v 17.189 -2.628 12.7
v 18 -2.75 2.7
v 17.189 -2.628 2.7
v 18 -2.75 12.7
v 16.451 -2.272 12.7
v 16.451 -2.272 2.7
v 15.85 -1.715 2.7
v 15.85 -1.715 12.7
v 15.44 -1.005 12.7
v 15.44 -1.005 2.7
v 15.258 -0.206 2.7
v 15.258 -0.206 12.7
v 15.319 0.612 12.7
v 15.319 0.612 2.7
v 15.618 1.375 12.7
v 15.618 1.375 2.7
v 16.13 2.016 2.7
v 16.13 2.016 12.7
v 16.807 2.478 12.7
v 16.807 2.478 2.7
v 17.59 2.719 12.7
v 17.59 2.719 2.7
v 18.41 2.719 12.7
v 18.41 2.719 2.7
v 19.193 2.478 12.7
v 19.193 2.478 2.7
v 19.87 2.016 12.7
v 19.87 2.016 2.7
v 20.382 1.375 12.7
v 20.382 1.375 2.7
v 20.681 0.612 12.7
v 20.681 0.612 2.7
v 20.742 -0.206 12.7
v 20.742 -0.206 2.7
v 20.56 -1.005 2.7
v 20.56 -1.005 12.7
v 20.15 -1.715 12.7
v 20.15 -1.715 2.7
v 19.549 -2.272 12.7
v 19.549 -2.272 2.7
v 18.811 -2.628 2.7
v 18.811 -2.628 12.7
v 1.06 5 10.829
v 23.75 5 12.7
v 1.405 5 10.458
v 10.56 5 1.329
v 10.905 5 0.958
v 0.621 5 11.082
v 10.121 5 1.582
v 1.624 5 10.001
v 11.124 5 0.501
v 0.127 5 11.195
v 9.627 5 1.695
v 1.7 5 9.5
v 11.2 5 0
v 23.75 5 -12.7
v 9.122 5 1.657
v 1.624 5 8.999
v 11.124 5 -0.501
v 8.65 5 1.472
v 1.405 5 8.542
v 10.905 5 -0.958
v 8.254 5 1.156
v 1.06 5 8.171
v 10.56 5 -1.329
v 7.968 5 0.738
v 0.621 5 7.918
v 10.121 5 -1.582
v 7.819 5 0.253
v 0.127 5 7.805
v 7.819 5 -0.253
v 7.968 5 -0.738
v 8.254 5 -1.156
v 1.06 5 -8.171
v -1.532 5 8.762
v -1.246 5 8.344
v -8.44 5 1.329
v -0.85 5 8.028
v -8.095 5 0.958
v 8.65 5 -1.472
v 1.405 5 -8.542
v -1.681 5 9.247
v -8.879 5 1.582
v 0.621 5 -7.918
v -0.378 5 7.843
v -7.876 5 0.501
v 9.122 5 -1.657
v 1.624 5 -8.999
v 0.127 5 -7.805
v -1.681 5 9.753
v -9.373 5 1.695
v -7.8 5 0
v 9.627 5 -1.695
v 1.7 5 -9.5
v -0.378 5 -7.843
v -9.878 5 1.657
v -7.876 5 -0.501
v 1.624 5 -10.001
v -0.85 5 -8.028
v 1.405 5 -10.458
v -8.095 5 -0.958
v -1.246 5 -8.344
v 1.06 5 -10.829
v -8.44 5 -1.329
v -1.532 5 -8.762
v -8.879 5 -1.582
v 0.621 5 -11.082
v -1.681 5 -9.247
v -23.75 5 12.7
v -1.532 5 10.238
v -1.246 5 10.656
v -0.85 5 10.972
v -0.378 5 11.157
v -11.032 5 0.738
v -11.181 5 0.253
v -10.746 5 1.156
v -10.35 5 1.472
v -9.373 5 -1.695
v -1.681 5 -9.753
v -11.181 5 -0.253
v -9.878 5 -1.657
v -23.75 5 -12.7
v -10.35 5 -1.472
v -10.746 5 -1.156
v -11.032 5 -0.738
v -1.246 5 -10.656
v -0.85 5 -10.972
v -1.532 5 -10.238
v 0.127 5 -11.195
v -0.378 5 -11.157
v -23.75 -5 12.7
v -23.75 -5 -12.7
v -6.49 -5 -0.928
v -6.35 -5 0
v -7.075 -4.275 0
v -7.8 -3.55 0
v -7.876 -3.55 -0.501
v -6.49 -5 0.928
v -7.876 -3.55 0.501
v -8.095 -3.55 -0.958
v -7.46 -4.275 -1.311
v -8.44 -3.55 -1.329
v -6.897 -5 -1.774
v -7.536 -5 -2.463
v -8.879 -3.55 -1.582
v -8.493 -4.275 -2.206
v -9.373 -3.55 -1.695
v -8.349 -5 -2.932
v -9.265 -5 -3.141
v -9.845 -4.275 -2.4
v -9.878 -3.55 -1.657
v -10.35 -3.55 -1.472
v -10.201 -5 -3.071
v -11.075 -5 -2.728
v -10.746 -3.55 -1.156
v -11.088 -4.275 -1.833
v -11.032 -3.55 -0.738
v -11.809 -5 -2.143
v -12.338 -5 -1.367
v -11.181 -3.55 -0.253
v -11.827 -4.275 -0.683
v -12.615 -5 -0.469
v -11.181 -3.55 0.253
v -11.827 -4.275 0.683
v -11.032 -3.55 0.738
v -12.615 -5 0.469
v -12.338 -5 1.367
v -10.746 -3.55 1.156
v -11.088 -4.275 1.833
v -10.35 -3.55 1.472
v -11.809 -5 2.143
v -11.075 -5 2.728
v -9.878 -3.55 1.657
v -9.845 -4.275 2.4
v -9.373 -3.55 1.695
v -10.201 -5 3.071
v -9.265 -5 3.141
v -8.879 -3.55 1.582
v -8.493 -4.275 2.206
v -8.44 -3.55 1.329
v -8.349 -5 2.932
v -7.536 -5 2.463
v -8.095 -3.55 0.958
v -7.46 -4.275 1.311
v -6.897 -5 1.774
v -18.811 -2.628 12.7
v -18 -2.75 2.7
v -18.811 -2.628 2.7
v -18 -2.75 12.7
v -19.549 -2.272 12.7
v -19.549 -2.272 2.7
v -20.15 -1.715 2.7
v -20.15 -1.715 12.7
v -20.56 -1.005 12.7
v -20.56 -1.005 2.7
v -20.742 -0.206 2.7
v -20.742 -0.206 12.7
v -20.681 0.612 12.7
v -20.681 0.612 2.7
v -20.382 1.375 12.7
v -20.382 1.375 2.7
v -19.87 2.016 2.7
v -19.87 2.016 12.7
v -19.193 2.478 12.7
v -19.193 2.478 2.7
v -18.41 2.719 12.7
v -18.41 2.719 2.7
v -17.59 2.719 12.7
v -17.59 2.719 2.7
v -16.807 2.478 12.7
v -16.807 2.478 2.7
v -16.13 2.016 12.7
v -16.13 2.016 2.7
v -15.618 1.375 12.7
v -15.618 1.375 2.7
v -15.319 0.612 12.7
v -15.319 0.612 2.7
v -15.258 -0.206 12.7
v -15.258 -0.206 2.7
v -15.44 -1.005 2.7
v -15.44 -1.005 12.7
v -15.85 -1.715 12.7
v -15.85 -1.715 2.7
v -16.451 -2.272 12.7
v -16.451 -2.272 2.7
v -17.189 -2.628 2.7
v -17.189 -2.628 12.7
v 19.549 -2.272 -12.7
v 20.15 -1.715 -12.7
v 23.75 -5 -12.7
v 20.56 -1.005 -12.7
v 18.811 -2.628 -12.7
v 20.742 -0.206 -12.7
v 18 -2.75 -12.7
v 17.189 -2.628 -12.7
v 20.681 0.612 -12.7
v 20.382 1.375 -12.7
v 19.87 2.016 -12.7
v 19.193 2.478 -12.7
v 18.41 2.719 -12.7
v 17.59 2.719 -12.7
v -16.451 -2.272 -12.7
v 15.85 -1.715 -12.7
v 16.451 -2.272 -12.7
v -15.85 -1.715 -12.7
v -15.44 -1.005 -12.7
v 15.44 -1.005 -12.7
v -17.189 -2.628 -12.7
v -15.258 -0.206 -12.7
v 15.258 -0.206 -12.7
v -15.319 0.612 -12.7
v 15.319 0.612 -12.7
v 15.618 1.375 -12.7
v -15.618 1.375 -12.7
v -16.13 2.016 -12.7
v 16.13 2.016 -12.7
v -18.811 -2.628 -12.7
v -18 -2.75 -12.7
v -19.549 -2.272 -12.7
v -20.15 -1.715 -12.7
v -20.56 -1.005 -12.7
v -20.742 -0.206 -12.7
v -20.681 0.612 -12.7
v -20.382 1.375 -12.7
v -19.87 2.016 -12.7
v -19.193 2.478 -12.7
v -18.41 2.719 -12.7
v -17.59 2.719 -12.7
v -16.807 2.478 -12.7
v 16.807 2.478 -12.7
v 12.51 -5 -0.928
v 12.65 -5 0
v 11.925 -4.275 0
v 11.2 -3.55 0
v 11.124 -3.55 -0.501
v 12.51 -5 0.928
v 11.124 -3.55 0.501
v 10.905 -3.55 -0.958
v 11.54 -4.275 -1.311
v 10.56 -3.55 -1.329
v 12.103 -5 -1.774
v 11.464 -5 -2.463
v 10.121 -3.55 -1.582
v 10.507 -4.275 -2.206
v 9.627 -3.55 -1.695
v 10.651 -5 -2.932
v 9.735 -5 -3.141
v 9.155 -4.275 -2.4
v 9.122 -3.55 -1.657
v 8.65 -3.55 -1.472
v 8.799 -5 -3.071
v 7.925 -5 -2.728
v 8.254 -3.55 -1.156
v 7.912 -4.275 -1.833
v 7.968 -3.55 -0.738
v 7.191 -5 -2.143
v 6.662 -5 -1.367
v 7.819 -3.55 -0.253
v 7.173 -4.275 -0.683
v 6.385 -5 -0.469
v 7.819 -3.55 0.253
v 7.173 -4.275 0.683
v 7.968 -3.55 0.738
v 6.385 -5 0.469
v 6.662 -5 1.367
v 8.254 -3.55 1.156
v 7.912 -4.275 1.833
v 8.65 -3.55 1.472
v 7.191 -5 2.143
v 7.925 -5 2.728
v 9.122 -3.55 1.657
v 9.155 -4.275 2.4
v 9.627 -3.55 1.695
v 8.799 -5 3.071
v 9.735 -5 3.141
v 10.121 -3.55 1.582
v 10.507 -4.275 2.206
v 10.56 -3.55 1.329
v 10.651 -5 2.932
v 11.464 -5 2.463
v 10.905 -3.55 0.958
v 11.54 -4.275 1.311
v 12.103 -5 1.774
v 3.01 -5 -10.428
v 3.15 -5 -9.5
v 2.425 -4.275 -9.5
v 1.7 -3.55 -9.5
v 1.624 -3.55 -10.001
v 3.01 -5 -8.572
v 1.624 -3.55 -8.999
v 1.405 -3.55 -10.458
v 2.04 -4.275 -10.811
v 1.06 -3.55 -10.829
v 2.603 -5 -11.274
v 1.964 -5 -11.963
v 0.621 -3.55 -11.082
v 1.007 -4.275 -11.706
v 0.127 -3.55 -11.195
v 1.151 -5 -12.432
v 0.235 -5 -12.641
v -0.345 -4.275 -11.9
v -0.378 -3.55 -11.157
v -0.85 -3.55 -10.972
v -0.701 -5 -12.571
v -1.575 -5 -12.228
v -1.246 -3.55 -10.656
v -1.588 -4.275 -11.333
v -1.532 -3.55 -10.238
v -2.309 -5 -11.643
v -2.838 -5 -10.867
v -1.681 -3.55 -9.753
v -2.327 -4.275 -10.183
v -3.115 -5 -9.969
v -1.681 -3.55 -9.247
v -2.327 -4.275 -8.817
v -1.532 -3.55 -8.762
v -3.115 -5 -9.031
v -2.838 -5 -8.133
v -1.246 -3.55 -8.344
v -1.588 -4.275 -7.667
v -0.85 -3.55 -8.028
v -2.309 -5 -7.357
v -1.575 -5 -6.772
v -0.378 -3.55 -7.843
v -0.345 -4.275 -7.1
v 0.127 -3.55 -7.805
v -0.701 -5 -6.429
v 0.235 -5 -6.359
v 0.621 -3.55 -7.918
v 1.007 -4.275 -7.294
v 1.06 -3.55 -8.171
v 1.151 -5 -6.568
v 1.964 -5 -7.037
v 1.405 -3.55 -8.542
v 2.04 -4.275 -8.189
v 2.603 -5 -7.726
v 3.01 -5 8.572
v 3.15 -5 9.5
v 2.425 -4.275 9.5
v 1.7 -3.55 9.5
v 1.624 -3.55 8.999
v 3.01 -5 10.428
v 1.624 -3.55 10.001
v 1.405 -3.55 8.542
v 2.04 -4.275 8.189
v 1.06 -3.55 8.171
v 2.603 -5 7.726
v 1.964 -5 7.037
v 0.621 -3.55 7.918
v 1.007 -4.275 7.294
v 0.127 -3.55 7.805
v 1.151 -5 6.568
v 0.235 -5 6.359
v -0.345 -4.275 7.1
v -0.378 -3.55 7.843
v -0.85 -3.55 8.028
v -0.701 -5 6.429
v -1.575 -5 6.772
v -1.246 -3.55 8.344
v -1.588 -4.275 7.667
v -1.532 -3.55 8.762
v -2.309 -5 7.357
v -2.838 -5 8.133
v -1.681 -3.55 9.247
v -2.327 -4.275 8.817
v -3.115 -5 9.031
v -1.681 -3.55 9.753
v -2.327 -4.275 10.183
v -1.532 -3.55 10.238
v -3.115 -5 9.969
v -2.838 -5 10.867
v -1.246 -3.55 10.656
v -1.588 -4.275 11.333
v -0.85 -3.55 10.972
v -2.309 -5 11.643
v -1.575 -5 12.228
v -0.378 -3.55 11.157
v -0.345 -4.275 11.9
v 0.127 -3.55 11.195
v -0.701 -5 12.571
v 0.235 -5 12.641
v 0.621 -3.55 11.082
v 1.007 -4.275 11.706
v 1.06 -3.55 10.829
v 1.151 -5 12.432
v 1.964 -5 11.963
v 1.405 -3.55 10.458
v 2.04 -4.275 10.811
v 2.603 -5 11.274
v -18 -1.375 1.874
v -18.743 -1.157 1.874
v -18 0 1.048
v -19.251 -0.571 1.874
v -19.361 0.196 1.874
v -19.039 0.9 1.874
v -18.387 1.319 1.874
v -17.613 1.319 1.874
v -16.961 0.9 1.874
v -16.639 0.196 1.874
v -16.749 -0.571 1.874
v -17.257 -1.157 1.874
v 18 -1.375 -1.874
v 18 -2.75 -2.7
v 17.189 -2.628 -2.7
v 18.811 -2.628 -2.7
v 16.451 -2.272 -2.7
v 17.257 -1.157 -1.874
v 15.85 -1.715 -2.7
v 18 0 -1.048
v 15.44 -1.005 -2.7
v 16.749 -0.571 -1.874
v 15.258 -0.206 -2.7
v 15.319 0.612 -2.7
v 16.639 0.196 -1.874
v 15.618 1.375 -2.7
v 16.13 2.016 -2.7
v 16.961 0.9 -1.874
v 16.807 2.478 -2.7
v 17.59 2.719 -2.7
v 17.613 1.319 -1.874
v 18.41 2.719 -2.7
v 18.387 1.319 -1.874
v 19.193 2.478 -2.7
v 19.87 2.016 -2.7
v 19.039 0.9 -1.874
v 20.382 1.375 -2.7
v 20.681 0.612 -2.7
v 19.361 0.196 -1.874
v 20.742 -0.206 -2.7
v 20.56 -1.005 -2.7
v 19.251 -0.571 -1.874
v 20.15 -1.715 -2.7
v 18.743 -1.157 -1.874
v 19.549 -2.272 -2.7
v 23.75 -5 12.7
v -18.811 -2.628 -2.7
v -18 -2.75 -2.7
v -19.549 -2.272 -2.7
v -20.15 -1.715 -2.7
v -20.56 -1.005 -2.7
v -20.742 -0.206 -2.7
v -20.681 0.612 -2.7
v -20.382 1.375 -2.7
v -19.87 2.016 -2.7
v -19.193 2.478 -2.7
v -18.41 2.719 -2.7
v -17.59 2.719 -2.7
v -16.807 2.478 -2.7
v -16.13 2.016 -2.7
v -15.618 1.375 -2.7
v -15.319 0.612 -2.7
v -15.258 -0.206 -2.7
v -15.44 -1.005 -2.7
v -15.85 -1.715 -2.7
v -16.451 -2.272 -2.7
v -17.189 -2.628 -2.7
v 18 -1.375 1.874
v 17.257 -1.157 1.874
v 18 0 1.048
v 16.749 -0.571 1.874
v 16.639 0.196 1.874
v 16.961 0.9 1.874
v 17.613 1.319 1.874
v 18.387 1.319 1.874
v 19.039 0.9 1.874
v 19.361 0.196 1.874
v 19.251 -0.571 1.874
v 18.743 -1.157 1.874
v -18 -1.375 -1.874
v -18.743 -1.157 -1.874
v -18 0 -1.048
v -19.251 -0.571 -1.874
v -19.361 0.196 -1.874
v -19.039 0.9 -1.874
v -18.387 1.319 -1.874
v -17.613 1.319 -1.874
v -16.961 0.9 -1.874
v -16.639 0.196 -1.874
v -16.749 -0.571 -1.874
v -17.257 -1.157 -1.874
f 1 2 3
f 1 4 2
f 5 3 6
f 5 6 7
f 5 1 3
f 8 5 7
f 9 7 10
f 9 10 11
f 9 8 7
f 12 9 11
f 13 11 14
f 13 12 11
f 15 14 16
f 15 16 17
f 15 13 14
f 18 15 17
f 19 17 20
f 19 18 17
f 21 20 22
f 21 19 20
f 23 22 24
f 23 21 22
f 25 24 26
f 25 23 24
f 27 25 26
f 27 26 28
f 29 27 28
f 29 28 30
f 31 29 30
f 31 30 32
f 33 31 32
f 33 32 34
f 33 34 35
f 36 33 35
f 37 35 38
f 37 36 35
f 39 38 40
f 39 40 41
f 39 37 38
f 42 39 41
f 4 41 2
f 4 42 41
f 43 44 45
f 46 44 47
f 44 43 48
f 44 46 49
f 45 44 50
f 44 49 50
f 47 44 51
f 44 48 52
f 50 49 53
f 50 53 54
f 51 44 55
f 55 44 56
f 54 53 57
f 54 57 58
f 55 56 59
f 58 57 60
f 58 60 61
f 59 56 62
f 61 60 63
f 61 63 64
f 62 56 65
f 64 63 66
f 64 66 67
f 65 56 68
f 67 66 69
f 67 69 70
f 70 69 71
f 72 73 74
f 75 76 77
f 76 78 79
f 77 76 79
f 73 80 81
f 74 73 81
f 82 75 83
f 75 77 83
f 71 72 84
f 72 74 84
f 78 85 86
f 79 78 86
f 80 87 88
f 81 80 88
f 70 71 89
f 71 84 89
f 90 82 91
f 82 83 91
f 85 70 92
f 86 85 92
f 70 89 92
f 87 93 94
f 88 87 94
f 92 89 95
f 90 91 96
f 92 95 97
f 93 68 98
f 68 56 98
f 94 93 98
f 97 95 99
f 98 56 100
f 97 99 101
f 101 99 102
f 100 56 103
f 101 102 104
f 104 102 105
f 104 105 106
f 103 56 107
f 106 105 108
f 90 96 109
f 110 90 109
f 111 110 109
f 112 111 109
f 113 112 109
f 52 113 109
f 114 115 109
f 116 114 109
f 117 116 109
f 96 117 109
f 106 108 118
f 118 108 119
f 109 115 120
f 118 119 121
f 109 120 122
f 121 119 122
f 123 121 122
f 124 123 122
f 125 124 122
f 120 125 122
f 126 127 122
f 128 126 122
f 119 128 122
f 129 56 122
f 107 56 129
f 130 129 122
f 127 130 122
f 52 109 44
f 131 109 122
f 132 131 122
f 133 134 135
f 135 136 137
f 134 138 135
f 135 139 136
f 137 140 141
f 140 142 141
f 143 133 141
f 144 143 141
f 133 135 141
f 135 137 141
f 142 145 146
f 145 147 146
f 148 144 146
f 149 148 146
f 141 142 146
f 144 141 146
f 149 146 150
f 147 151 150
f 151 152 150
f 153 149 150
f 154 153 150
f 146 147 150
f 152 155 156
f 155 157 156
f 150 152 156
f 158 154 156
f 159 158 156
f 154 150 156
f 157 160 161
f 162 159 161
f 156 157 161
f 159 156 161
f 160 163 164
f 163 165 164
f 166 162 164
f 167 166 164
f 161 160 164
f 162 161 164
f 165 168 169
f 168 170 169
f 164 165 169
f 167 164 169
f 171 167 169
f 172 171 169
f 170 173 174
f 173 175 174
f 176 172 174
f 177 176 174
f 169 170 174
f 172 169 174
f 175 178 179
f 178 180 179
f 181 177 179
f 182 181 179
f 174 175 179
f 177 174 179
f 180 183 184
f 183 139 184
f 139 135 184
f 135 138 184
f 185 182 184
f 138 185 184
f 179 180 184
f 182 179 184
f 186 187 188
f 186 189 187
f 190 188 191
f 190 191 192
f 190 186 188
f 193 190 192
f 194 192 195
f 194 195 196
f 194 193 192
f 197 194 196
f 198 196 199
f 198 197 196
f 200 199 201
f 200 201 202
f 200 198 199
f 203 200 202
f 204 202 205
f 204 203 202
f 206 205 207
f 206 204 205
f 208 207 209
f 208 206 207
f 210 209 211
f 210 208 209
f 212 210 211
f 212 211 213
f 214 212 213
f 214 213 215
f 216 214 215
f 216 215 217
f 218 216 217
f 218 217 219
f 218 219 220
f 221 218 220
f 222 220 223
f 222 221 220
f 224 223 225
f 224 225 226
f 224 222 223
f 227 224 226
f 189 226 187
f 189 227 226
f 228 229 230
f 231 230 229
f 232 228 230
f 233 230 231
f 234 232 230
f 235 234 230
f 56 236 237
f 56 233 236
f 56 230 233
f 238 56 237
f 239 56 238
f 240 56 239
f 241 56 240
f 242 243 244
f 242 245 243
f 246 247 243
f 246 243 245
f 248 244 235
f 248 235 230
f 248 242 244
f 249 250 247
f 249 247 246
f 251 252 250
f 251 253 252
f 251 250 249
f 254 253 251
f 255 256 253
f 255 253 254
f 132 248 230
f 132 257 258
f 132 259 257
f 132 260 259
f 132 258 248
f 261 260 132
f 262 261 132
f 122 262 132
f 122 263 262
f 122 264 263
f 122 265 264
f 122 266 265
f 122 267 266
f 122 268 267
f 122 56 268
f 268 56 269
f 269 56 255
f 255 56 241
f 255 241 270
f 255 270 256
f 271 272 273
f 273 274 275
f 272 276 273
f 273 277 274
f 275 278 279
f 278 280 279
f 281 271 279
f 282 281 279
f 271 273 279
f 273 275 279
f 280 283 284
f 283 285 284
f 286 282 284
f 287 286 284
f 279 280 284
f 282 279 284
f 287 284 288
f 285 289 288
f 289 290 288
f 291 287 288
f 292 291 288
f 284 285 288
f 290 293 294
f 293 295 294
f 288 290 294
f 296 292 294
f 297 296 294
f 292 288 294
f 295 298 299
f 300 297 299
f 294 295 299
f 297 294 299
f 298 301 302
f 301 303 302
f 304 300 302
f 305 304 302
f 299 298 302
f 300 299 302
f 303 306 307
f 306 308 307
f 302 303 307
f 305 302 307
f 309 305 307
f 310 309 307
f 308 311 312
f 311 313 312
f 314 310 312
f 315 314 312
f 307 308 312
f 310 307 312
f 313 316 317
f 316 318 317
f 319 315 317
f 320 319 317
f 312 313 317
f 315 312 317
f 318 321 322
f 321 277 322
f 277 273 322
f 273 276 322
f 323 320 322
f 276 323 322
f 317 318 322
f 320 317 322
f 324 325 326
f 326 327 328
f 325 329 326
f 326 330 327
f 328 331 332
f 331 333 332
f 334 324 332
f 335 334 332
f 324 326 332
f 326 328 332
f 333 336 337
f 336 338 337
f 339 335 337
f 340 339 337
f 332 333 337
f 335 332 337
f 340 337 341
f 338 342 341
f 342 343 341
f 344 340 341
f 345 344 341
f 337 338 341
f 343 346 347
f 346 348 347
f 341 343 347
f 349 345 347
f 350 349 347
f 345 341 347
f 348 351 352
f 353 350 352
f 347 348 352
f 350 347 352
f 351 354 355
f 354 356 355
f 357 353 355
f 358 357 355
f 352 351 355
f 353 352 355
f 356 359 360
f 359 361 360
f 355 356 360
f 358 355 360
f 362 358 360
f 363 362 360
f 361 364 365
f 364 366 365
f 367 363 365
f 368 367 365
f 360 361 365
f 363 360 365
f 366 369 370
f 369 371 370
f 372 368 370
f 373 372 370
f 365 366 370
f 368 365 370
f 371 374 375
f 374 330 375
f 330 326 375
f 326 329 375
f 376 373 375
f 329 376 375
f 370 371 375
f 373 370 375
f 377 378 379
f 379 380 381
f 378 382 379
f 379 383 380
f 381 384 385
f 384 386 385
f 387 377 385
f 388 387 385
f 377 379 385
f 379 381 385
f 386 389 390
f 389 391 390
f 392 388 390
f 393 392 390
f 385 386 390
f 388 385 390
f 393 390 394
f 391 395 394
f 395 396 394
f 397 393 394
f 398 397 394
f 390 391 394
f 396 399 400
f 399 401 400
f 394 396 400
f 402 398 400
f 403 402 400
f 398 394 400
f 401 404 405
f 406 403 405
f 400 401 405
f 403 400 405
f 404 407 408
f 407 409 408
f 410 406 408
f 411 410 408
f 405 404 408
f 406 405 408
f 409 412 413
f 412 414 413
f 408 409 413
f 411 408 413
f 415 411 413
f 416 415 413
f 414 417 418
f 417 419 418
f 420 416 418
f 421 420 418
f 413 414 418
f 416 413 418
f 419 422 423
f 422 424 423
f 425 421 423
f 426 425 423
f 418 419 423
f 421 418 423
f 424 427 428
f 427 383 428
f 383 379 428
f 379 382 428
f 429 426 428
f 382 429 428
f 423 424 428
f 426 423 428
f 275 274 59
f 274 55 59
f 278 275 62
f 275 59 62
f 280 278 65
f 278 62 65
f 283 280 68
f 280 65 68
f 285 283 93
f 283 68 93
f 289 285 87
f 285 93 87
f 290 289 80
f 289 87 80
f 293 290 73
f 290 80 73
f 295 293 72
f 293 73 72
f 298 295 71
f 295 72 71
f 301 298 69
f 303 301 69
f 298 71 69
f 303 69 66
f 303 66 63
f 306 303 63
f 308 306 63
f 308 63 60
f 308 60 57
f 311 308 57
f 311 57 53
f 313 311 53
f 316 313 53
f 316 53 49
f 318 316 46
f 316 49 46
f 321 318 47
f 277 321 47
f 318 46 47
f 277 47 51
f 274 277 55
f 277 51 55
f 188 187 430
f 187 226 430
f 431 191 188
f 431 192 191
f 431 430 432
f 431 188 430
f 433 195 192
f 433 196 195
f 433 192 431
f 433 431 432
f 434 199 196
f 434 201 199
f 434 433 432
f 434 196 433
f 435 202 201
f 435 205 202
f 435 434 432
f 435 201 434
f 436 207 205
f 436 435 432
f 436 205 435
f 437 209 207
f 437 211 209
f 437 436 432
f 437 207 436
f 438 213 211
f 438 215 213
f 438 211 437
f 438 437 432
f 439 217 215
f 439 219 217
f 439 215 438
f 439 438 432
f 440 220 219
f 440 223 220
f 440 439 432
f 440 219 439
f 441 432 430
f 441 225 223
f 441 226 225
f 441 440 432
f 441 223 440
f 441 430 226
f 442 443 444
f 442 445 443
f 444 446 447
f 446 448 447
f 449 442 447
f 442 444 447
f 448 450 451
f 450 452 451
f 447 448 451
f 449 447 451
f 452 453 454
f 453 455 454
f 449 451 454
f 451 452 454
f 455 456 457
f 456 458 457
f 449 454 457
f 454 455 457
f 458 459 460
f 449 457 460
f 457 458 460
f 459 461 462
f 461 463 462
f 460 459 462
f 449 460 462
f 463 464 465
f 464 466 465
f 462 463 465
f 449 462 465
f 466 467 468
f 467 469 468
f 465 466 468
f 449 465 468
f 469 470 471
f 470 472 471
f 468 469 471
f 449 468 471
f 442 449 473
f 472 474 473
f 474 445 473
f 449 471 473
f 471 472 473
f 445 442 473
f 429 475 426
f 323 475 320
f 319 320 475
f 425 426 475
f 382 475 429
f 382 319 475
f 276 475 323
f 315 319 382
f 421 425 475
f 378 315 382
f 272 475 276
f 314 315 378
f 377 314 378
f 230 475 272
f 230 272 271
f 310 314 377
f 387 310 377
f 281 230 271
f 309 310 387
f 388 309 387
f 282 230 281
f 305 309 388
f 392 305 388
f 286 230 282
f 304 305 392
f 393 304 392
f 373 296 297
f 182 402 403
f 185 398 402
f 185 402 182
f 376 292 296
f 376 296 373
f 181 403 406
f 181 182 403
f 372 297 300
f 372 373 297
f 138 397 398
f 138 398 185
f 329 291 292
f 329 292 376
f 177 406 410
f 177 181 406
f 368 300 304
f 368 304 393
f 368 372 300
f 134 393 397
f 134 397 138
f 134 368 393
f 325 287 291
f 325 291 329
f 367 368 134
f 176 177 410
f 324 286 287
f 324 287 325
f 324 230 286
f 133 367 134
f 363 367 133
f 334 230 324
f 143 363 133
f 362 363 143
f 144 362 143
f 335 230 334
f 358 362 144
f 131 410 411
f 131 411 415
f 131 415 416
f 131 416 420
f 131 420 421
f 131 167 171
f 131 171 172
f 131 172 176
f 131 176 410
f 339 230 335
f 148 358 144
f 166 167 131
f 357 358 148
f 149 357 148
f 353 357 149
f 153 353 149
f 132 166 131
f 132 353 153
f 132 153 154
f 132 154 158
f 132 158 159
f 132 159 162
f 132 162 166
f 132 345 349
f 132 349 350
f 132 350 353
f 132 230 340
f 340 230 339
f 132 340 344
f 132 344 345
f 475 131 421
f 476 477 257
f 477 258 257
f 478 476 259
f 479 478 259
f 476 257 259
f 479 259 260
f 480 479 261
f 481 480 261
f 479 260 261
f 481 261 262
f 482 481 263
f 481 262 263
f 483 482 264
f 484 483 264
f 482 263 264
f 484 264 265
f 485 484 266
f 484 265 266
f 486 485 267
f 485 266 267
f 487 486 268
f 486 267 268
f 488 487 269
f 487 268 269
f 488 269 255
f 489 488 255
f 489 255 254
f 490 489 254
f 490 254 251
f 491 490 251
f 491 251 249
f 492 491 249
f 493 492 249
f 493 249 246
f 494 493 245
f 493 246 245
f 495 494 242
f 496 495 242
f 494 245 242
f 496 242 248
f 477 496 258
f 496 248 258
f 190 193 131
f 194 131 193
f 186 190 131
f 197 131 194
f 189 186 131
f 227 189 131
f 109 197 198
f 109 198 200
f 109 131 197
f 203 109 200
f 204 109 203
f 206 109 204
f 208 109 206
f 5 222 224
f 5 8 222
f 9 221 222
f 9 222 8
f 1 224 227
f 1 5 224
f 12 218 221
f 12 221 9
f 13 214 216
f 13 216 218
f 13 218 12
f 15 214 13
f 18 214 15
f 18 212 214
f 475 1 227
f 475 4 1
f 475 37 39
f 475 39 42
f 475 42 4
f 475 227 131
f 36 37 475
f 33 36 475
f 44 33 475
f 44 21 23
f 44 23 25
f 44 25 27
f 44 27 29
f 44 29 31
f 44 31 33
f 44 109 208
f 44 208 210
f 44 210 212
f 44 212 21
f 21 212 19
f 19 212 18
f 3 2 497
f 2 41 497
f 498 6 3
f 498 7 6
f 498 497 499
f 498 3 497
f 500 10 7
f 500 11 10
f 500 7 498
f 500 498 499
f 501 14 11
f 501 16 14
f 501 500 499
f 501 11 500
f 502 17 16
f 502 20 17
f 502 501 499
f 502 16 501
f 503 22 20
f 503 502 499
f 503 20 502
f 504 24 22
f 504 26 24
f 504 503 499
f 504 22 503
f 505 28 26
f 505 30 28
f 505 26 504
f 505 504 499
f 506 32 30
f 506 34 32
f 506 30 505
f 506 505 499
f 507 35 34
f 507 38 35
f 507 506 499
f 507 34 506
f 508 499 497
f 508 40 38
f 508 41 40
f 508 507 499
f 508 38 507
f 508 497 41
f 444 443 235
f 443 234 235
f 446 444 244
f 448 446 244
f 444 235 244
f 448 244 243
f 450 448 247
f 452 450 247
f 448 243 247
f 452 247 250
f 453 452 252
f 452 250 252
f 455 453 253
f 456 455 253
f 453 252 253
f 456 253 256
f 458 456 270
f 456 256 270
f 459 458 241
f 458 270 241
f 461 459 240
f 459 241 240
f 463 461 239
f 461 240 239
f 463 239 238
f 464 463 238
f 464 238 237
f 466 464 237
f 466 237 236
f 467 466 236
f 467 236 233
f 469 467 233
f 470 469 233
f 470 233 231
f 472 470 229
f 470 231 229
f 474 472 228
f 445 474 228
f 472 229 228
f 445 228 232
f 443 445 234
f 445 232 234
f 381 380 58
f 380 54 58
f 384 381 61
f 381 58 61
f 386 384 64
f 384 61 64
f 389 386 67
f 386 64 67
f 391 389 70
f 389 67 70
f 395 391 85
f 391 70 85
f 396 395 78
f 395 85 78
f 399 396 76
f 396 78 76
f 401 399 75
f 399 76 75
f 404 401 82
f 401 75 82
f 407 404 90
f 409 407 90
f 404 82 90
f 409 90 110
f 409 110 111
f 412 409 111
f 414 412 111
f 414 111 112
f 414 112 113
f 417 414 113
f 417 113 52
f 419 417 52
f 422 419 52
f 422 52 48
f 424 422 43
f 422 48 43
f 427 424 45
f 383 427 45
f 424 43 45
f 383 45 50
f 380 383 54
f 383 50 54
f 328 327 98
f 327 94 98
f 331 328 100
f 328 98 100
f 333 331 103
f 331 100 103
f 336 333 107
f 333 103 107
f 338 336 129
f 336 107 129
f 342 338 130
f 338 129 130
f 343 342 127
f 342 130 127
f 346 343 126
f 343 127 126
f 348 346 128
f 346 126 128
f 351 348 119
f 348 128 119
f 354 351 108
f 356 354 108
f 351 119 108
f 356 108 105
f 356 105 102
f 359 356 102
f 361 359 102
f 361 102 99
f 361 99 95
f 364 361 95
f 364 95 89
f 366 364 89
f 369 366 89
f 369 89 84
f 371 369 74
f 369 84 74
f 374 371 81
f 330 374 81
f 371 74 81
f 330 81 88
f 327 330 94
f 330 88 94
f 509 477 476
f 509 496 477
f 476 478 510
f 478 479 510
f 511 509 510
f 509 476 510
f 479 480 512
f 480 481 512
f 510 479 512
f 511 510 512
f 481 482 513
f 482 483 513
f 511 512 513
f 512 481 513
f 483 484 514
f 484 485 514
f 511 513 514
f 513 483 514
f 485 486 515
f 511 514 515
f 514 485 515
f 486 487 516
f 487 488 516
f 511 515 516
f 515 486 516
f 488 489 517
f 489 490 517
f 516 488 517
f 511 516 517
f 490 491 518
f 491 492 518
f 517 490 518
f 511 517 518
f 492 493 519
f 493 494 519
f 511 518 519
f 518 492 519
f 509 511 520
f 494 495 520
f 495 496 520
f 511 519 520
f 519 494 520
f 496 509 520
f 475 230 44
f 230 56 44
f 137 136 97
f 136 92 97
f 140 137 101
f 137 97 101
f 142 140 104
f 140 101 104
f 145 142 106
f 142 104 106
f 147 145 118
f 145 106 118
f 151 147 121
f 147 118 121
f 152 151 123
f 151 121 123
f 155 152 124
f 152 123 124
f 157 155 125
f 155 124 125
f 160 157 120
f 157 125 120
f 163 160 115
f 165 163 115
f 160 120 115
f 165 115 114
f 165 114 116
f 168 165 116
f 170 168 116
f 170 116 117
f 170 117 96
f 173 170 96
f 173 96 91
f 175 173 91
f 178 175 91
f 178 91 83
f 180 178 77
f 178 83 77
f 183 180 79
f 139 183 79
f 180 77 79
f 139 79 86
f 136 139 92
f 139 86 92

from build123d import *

# Parameters (mm, degrees)
BOSS_EXTRUDE1_DEPTH                             = 5
CSK_FOR_M3_FLAT_HEAD_MACHINE_SCREW1_D           = 3.4
CSK_FOR_M3_FLAT_HEAD_MACHINE_SCREW1_CSINK_D     = 6.3
CSK_FOR_M3_FLAT_HEAD_MACHINE_SCREW1_CSINK_ANGLE = 90
F_5_5_5_5_DIAMETER_HOLE1_AT_2_COUNT             = 2
F_5_5_5_5_DIAMETER_HOLE1_AT_2_PITCH             = 36


with BuildPart() as part:
    # Sketch1 → Boss-Extrude1 (new body, symmetric)
    with BuildSketch(Plane(origin=(0, 0, 0), x_dir=(1, 0, 0), z_dir=(0, 1, 0))):
        Polygon((-23.75, 12.7), (-15.25, 12.7), (15.25, 12.7), (23.75, 12.7), (23.75, -12.7), (15.25, -12.7), (-15.25, -12.7), (-23.75, -12.7), align=None)
    extrude(amount=BOSS_EXTRUDE1_DEPTH, both=True)

    # CSK for M3 Flat Head Machine Screw1 (through all)
    with Locations(Plane(origin=(0, -5, 0), x_dir=(-1, 0, 0), z_dir=(0, -1, 0))):
        with Locations((-9.5, 0), (0, 9.5), (9.5, 0), (0, -9.5)):
            CounterSinkHole(CSK_FOR_M3_FLAT_HEAD_MACHINE_SCREW1_D / 2, CSK_FOR_M3_FLAT_HEAD_MACHINE_SCREW1_CSINK_D / 2, counter_sink_angle=CSK_FOR_M3_FLAT_HEAD_MACHINE_SCREW1_CSINK_ANGLE)

    # Sketch10 → Ø5.5 (5.5) Diameter Hole1 (revolve, cut)
    with BuildSketch(Plane(origin=(-18, 0, 12.7), x_dir=(0, -1, 0), z_dir=(1, 0, 0))):
        Polygon((0, 0), (0, 11.652366702), (2.75, 10), (2.75, 0), align=None)
    f_5_5_5_5_diameter_hole1 = revolve(axis=Axis((-18, 0, 19.05), (0, 0, -1)), mode=Mode.SUBTRACT)

    # Ø5.5 (5.5) Diameter Hole1 at 2: Ø5.5 (5.5) Diameter Hole1 ×2
    with Locations(*[(i * F_5_5_5_5_DIAMETER_HOLE1_AT_2_PITCH, 0, 0) for i in range(1, F_5_5_5_5_DIAMETER_HOLE1_AT_2_COUNT)]):
        add(f_5_5_5_5_diameter_hole1, mode=Mode.SUBTRACT)

    # Mirror1: Ø5.5 (5.5) Diameter Hole1 across plane
    add(f_5_5_5_5_diameter_hole1.mirror(Plane.XY), mode=Mode.SUBTRACT)

    # Mirror1 copy 1 sketch → Mirror1 copy 1 (revolve, cut)
    with BuildSketch(Plane(origin=(18, 0, -12.7), x_dir=(0, -1, 0), z_dir=(1, 0, 0))):
        Polygon((0, 0), (0, -11.652366702), (2.75, -10), (2.75, 0), align=None)
    revolve(axis=Axis((18, 0, -19.05), (0, 0, -1)), mode=Mode.SUBTRACT)


solid = part.part
